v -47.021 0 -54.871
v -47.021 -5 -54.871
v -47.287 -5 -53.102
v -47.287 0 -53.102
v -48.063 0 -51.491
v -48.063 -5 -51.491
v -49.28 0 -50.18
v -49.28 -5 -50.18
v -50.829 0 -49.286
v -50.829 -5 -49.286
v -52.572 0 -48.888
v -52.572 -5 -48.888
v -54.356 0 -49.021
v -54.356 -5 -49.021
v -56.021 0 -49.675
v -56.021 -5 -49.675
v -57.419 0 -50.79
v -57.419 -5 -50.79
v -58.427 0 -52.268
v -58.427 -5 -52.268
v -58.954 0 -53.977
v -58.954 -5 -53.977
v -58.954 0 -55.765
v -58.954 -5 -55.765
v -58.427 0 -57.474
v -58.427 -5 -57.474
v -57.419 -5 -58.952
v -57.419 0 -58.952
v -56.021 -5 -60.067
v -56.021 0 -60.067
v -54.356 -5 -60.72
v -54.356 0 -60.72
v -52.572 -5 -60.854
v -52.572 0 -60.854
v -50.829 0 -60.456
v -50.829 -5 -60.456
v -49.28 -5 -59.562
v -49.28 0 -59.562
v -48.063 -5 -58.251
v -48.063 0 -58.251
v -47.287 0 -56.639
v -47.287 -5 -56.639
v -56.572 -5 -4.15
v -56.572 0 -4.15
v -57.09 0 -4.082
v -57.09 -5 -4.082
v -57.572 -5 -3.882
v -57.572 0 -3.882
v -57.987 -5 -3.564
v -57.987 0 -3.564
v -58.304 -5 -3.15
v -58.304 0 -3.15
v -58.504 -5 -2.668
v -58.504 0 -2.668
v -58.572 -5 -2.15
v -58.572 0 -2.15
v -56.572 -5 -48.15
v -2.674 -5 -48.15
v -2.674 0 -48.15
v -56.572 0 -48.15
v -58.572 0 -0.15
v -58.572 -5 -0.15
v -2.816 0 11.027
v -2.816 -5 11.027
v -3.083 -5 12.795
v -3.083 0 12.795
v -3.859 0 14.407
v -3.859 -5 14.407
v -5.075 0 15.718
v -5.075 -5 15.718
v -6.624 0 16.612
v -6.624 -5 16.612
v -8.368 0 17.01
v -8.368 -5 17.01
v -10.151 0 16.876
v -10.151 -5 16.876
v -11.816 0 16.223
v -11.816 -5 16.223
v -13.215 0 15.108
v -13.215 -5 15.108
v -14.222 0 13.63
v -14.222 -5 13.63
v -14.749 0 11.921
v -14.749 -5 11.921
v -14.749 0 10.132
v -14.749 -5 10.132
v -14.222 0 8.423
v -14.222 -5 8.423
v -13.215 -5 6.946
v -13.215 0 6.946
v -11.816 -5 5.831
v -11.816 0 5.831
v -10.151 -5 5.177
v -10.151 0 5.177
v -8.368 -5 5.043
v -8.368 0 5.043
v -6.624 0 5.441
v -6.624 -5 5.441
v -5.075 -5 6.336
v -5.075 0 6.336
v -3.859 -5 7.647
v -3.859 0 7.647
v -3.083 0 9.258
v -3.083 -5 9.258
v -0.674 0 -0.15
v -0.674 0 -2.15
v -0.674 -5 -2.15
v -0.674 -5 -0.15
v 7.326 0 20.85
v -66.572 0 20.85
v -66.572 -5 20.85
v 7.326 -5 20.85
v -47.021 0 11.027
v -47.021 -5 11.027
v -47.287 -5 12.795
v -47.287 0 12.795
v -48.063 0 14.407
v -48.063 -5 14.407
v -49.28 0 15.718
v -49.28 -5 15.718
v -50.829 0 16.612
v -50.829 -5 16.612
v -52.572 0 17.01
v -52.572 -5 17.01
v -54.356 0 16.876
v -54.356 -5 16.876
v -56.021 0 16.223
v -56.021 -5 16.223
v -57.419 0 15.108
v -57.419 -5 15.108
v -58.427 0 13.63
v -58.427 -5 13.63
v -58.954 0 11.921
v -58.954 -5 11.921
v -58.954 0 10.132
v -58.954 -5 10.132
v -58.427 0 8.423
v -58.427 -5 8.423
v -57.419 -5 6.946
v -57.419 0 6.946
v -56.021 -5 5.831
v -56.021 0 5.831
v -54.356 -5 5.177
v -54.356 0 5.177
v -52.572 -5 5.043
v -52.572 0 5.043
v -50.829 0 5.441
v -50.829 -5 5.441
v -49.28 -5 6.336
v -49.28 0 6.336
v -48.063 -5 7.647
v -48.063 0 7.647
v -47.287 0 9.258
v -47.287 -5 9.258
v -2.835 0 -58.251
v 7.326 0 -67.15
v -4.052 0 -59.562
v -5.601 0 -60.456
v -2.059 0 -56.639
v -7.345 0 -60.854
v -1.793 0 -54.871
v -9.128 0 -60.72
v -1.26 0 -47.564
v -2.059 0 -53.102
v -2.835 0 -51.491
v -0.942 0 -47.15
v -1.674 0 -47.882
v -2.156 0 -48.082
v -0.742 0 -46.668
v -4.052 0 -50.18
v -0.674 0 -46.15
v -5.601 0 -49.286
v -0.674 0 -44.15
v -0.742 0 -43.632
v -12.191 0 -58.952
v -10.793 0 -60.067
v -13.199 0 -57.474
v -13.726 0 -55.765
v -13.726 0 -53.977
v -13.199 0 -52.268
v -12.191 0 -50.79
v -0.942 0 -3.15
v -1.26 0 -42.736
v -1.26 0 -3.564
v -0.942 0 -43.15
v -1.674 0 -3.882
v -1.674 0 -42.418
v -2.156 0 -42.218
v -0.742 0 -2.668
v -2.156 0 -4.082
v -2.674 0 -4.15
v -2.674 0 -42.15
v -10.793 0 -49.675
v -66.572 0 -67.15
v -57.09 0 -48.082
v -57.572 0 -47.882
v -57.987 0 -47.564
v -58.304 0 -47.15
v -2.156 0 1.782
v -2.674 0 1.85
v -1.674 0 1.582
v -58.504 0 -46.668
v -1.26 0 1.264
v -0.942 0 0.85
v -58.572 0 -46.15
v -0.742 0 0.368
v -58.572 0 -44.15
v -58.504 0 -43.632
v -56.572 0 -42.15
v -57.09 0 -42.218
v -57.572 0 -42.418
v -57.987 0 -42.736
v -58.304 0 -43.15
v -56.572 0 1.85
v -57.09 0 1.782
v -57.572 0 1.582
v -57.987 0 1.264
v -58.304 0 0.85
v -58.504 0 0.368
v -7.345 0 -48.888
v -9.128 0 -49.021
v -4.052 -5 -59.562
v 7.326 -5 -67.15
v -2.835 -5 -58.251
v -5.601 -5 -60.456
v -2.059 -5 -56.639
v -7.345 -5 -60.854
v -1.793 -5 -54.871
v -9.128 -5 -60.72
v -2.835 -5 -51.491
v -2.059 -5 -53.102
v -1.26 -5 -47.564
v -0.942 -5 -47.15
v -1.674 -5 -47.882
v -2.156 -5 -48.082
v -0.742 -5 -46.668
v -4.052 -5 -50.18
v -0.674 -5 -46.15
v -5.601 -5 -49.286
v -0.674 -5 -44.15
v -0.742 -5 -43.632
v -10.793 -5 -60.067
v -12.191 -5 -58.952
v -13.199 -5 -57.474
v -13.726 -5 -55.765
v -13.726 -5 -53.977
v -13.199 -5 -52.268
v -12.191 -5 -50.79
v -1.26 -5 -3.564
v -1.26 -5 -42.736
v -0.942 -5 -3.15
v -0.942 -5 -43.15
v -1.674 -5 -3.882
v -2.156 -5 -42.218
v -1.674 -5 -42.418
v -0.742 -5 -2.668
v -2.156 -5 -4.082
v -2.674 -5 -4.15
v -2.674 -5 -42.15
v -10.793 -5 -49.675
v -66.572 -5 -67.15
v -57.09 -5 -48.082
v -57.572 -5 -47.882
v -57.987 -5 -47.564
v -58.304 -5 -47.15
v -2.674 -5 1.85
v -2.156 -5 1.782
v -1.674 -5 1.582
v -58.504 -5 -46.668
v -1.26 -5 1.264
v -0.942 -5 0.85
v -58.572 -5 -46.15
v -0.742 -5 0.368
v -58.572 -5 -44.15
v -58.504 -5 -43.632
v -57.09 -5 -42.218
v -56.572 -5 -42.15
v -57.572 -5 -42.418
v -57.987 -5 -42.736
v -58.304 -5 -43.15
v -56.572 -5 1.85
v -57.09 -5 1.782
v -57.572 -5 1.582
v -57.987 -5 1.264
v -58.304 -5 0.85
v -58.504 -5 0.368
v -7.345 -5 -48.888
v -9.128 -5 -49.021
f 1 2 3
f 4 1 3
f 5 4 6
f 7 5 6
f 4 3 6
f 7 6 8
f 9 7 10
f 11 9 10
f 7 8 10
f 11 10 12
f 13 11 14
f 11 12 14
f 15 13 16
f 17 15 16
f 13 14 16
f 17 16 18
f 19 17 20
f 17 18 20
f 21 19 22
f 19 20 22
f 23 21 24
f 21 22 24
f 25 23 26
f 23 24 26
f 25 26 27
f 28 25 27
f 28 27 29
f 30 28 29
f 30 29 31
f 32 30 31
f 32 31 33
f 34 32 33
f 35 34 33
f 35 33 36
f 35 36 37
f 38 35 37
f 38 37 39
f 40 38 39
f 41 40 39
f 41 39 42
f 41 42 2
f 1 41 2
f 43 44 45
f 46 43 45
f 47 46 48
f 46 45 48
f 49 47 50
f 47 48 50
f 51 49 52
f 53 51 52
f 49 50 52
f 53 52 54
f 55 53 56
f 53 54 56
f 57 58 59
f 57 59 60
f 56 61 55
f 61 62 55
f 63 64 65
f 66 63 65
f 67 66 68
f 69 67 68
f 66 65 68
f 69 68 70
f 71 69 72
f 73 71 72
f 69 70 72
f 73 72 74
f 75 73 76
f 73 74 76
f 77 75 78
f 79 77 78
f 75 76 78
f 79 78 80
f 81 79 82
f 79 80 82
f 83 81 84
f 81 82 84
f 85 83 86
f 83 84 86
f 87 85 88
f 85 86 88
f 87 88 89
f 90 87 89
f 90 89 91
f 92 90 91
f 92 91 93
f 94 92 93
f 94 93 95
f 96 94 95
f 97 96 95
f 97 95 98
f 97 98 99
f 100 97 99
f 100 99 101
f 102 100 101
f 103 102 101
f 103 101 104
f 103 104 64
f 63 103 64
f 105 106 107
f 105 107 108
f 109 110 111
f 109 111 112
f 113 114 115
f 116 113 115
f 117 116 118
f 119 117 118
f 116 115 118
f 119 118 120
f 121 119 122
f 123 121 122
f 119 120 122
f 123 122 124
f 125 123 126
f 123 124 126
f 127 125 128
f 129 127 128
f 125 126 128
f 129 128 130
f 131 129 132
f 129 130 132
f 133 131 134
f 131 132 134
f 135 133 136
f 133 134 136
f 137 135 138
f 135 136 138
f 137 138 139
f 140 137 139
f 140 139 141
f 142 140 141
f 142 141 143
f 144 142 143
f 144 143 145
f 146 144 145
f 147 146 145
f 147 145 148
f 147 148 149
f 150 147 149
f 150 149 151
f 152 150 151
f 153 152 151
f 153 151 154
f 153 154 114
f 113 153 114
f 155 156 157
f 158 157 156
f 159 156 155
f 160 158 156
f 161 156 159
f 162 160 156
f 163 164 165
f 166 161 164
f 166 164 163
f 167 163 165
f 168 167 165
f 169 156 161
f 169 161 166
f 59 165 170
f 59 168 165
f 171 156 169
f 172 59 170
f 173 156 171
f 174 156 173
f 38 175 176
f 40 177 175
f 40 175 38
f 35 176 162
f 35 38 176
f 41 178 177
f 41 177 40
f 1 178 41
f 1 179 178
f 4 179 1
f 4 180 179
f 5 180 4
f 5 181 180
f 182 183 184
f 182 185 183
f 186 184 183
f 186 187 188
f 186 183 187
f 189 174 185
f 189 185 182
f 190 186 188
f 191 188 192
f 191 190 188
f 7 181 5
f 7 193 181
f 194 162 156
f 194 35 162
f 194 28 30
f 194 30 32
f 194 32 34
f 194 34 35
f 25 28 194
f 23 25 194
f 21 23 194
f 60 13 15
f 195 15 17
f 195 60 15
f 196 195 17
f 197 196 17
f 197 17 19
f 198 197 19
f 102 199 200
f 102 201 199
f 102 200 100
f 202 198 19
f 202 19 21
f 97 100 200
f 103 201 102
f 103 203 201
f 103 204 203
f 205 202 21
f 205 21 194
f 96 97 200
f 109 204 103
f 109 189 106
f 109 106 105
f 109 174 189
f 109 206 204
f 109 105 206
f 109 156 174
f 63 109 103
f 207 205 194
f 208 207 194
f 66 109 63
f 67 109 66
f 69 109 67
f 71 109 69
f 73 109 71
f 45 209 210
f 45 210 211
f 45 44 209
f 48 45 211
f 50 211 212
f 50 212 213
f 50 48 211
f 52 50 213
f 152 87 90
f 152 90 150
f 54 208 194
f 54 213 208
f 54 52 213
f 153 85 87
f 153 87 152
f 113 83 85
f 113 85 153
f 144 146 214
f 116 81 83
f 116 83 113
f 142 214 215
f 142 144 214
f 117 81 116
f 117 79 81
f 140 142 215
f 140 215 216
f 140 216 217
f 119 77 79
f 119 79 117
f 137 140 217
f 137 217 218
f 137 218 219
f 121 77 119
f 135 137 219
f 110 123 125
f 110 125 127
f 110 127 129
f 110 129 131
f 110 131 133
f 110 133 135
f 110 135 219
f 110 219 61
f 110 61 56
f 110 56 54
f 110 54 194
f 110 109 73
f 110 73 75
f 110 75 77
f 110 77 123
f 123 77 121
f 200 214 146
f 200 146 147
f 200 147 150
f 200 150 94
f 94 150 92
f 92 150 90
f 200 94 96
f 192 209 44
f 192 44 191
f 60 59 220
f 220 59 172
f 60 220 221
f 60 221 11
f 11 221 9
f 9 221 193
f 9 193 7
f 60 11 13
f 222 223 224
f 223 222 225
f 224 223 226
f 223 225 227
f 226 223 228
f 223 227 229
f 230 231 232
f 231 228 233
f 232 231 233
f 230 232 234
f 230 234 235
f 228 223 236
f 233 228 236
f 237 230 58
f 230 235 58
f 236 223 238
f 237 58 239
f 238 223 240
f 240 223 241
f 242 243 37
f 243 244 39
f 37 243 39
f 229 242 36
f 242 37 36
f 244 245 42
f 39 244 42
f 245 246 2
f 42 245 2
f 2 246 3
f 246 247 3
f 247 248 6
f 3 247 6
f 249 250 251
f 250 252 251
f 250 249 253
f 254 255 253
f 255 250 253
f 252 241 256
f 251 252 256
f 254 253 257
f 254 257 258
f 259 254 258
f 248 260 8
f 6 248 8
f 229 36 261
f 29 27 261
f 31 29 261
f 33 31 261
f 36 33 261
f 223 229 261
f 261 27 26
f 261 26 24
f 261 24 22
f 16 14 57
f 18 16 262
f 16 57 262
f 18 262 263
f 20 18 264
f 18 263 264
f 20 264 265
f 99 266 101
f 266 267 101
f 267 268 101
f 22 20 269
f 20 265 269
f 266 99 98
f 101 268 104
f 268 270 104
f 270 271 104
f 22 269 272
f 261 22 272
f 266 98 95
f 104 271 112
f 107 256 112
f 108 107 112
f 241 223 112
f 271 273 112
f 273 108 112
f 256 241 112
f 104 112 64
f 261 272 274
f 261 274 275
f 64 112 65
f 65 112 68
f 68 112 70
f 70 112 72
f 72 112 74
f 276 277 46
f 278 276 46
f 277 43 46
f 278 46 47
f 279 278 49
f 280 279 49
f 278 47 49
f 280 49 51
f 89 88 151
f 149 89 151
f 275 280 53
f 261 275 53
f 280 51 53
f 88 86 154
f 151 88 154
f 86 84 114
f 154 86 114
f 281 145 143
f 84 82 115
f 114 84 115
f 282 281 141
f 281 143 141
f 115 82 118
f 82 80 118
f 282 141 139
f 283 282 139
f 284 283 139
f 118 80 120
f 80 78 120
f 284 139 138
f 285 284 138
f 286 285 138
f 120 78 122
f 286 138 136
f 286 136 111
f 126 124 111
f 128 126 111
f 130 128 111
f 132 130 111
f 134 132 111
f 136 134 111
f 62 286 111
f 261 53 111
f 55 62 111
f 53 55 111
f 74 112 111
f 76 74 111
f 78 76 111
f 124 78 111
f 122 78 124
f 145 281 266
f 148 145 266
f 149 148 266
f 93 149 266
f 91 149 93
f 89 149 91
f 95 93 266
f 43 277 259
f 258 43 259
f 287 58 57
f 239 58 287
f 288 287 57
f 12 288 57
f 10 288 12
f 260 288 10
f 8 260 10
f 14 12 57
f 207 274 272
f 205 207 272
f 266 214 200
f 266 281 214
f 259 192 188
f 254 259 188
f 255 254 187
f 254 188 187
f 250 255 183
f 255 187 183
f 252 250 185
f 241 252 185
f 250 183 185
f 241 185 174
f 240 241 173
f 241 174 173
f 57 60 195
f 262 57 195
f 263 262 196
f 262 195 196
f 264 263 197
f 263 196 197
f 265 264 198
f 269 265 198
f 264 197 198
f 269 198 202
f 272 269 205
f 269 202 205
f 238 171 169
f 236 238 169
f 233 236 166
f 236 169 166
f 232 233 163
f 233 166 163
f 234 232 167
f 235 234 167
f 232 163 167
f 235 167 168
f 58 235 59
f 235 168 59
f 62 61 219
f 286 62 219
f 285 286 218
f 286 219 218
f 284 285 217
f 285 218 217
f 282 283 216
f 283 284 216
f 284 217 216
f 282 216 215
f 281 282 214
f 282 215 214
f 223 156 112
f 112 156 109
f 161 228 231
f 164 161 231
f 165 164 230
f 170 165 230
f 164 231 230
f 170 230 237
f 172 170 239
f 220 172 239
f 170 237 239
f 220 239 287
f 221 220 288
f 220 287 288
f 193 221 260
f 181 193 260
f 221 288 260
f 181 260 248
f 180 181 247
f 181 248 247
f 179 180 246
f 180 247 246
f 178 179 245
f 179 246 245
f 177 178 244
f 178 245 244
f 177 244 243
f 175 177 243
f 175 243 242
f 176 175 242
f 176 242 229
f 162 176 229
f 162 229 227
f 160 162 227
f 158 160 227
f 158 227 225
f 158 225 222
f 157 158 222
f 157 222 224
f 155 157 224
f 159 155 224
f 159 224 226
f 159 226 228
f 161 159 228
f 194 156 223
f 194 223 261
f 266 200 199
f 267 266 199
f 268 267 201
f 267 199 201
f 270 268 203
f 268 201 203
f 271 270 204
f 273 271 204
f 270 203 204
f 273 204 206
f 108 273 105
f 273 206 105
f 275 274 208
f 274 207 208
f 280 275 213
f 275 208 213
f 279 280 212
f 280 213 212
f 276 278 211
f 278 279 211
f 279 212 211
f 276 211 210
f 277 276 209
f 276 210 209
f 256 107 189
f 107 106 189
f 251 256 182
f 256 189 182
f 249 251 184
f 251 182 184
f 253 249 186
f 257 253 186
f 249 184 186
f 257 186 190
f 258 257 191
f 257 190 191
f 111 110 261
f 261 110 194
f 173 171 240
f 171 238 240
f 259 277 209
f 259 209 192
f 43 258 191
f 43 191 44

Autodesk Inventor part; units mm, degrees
ref_plane "YZ Plane" through (0, 0, 0) normal (1, 0, 0) x (0, 1, 0)
ref_plane "XZ Plane" through (0, 0, 0) normal (0, 1, 0) x (-1, 0, 0)
ref_plane "XY Plane" through (0, 0, 0) normal (0, 0, 1) x (1, 0, 0)
sketch "Sketch1" plane through (0, 0, 0) normal (0, 1, 0) x (-1, 0, 0)
  line L0 (58.5724, -67.15) -> (66.5724, -67.15) projected
  line L1 (58.5724, 20.85) -> (58.5724, -67.15) projected
  line L2 (66.5724, 20.85) -> (58.5724, 20.85) projected
  line L3 (66.5724, 20.85) -> (66.5724, -67.15) projected
  line L4 (-7.3261, 20.85) -> (0.6739, 20.85) projected
  line L5 (-7.3261, -67.15) -> (-7.3261, 20.85) projected
  line L6 (0.6739, -67.15) -> (-7.3261, -67.15) projected
  line L7 (0.6739, 20.85) -> (0.6739, -67.15) projected
  line L8 (58.5724, 20.85) -> (0.6739, 20.85)
  line L9 (58.5724, -67.15) -> (0.6739, -67.15)
  point P0 (0, 0)
extrude "Extrusion1" add sketch "Sketch1" against normal blind 5
sketch "Sketch2" plane through (0, -5, 0) normal (0, -1, 0) x (1, 0, 0)
  line L0 (-58.5724, 20.85) -> (-58.5724, -67.15) projected
  line L1 (-0.6739, -67.15) -> (-0.6739, 20.85) projected
  line L2 (-79.1232, -42.15) -> (-79.1232, -48.15) projected
  line L3 (-79.1232, 1.85) -> (-79.1232, -4.15) projected
  line L4 (-79.1232, 1.85) -> (-0.6739, 1.85)
  line L5 (-0.6739, 1.85) -> (-0.6739, -4.15)
  line L6 (-0.6739, -4.15) -> (-79.1232, -4.15)
  line L7 (-79.1232, -4.15) -> (-79.1232, 1.85)
  line L8 (-79.1232, -42.15) -> (-0.6739, -42.15)
  line L9 (-0.6739, -42.15) -> (-0.6739, -48.15)
  line L10 (-0.6739, -48.15) -> (-79.1232, -48.15)
  line L11 (-79.1232, -48.15) -> (-79.1232, -42.15)
  line L12 (-58.5724, 1.85) -> (-58.5724, -4.15)
  line L13 (-58.5724, -42.15) -> (-58.5724, -48.15)
  point P0 (0, 0)
  point P1 (-0.6739, -2.6877)
  point P2 (-58.5724, -2.6877)
  point P3 (-0.6739, -8.6877)
  point P4 (-58.5724, -8.6877)
extrude "Extrusion2" cut sketch "Sketch2" against normal blind 5 contours L4 L1 L6 L0 | L8 L1 L10 L0
fillet "Fillet1" radius 2 8 edges at (-58.5724, -2.5, 1.85) (-58.5724, -2.5, -4.15) (-0.6739, -2.5, 1.85) (-0.6739, -2.5, -4.15) (-0.6739, -2.5, -42.15) (-0.6739, -2.5, -48.15) (-58.5724, -2.5, -42.15) (-58.5724, -2.5, -48.15)
sketch "Sketch3" plane through (0, -5, 0) normal (0, -1, 0) x (1, 0, 0)
  circle A0 centre (-8.8162, 11.0267) radius 6 projected
  circle A1 centre (-53.0208, 11.0267) radius 6 projected
  circle A2 centre (-53.0208, -54.8709) radius 6 projected
  circle A3 centre (-7.7929, -54.8709) radius 6 projected
  point P0 (0, 0)
extrude "Extrusion3" cut sketch "Sketch3" against normal blind 10
properties part number "КВ33.000.105 - Заслонка"
